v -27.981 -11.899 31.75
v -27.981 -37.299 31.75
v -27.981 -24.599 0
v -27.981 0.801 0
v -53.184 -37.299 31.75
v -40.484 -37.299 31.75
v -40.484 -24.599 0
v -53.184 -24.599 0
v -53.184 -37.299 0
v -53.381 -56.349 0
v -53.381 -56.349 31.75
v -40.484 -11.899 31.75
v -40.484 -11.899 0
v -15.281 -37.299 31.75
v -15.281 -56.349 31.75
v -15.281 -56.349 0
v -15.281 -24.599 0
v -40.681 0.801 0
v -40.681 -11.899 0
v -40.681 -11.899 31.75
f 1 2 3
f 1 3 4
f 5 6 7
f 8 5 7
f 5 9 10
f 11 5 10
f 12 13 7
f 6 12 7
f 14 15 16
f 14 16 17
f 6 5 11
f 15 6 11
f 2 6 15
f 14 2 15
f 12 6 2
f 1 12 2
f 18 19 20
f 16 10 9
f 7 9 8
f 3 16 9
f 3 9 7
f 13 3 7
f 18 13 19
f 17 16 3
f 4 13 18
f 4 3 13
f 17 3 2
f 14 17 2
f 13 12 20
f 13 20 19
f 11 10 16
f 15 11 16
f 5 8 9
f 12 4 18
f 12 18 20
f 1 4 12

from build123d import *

# Parameters (mm, degrees)
F1_DEPTH = 31.75
F3_DEPTH = 12.7
F5_DEPTH = 12.7
F7_DEPTH = 12.7


with BuildPart() as f1:
    # F0 (on Top) → F1 (new body)
    with BuildSketch(Plane.XY):
        Polygon((-53.184141, -37.298974), (-53.380532, -56.348974), (-15.280532, -56.348974), (-15.280532, -37.298974), (-27.980532, -37.298974), (-27.980532, -11.898974), (-40.484141, -11.898974), (-40.484141, -37.298974), align=None)
    extrude(amount=F1_DEPTH)

    # F2 (on face) → F3 (join)
    with BuildSketch(Plane.YZ.offset(-27.980532)):
        Polygon((-24.598974, 0), (-37.298974, 31.75), (-37.298974, 0), align=None)
    extrude(amount=F3_DEPTH)

    # F4 (on face) → F5 (join)
    with BuildSketch(Plane(origin=(-40.484141, 0, 0), x_dir=(0, -1, 0), z_dir=(-1, 0, 0))):
        Polygon((37.298974, 0), (37.298974, 31.75), (24.598974, 0), align=None)
    extrude(amount=F5_DEPTH)

    # F6 (on face) → F7 (join)
    with BuildSketch(Plane.YZ.offset(-27.980532)):
        Polygon((0.801026, 0), (-11.898974, 31.75), (-11.898974, 0), align=None)
    extrude(amount=-F7_DEPTH)


solid = f1.part
